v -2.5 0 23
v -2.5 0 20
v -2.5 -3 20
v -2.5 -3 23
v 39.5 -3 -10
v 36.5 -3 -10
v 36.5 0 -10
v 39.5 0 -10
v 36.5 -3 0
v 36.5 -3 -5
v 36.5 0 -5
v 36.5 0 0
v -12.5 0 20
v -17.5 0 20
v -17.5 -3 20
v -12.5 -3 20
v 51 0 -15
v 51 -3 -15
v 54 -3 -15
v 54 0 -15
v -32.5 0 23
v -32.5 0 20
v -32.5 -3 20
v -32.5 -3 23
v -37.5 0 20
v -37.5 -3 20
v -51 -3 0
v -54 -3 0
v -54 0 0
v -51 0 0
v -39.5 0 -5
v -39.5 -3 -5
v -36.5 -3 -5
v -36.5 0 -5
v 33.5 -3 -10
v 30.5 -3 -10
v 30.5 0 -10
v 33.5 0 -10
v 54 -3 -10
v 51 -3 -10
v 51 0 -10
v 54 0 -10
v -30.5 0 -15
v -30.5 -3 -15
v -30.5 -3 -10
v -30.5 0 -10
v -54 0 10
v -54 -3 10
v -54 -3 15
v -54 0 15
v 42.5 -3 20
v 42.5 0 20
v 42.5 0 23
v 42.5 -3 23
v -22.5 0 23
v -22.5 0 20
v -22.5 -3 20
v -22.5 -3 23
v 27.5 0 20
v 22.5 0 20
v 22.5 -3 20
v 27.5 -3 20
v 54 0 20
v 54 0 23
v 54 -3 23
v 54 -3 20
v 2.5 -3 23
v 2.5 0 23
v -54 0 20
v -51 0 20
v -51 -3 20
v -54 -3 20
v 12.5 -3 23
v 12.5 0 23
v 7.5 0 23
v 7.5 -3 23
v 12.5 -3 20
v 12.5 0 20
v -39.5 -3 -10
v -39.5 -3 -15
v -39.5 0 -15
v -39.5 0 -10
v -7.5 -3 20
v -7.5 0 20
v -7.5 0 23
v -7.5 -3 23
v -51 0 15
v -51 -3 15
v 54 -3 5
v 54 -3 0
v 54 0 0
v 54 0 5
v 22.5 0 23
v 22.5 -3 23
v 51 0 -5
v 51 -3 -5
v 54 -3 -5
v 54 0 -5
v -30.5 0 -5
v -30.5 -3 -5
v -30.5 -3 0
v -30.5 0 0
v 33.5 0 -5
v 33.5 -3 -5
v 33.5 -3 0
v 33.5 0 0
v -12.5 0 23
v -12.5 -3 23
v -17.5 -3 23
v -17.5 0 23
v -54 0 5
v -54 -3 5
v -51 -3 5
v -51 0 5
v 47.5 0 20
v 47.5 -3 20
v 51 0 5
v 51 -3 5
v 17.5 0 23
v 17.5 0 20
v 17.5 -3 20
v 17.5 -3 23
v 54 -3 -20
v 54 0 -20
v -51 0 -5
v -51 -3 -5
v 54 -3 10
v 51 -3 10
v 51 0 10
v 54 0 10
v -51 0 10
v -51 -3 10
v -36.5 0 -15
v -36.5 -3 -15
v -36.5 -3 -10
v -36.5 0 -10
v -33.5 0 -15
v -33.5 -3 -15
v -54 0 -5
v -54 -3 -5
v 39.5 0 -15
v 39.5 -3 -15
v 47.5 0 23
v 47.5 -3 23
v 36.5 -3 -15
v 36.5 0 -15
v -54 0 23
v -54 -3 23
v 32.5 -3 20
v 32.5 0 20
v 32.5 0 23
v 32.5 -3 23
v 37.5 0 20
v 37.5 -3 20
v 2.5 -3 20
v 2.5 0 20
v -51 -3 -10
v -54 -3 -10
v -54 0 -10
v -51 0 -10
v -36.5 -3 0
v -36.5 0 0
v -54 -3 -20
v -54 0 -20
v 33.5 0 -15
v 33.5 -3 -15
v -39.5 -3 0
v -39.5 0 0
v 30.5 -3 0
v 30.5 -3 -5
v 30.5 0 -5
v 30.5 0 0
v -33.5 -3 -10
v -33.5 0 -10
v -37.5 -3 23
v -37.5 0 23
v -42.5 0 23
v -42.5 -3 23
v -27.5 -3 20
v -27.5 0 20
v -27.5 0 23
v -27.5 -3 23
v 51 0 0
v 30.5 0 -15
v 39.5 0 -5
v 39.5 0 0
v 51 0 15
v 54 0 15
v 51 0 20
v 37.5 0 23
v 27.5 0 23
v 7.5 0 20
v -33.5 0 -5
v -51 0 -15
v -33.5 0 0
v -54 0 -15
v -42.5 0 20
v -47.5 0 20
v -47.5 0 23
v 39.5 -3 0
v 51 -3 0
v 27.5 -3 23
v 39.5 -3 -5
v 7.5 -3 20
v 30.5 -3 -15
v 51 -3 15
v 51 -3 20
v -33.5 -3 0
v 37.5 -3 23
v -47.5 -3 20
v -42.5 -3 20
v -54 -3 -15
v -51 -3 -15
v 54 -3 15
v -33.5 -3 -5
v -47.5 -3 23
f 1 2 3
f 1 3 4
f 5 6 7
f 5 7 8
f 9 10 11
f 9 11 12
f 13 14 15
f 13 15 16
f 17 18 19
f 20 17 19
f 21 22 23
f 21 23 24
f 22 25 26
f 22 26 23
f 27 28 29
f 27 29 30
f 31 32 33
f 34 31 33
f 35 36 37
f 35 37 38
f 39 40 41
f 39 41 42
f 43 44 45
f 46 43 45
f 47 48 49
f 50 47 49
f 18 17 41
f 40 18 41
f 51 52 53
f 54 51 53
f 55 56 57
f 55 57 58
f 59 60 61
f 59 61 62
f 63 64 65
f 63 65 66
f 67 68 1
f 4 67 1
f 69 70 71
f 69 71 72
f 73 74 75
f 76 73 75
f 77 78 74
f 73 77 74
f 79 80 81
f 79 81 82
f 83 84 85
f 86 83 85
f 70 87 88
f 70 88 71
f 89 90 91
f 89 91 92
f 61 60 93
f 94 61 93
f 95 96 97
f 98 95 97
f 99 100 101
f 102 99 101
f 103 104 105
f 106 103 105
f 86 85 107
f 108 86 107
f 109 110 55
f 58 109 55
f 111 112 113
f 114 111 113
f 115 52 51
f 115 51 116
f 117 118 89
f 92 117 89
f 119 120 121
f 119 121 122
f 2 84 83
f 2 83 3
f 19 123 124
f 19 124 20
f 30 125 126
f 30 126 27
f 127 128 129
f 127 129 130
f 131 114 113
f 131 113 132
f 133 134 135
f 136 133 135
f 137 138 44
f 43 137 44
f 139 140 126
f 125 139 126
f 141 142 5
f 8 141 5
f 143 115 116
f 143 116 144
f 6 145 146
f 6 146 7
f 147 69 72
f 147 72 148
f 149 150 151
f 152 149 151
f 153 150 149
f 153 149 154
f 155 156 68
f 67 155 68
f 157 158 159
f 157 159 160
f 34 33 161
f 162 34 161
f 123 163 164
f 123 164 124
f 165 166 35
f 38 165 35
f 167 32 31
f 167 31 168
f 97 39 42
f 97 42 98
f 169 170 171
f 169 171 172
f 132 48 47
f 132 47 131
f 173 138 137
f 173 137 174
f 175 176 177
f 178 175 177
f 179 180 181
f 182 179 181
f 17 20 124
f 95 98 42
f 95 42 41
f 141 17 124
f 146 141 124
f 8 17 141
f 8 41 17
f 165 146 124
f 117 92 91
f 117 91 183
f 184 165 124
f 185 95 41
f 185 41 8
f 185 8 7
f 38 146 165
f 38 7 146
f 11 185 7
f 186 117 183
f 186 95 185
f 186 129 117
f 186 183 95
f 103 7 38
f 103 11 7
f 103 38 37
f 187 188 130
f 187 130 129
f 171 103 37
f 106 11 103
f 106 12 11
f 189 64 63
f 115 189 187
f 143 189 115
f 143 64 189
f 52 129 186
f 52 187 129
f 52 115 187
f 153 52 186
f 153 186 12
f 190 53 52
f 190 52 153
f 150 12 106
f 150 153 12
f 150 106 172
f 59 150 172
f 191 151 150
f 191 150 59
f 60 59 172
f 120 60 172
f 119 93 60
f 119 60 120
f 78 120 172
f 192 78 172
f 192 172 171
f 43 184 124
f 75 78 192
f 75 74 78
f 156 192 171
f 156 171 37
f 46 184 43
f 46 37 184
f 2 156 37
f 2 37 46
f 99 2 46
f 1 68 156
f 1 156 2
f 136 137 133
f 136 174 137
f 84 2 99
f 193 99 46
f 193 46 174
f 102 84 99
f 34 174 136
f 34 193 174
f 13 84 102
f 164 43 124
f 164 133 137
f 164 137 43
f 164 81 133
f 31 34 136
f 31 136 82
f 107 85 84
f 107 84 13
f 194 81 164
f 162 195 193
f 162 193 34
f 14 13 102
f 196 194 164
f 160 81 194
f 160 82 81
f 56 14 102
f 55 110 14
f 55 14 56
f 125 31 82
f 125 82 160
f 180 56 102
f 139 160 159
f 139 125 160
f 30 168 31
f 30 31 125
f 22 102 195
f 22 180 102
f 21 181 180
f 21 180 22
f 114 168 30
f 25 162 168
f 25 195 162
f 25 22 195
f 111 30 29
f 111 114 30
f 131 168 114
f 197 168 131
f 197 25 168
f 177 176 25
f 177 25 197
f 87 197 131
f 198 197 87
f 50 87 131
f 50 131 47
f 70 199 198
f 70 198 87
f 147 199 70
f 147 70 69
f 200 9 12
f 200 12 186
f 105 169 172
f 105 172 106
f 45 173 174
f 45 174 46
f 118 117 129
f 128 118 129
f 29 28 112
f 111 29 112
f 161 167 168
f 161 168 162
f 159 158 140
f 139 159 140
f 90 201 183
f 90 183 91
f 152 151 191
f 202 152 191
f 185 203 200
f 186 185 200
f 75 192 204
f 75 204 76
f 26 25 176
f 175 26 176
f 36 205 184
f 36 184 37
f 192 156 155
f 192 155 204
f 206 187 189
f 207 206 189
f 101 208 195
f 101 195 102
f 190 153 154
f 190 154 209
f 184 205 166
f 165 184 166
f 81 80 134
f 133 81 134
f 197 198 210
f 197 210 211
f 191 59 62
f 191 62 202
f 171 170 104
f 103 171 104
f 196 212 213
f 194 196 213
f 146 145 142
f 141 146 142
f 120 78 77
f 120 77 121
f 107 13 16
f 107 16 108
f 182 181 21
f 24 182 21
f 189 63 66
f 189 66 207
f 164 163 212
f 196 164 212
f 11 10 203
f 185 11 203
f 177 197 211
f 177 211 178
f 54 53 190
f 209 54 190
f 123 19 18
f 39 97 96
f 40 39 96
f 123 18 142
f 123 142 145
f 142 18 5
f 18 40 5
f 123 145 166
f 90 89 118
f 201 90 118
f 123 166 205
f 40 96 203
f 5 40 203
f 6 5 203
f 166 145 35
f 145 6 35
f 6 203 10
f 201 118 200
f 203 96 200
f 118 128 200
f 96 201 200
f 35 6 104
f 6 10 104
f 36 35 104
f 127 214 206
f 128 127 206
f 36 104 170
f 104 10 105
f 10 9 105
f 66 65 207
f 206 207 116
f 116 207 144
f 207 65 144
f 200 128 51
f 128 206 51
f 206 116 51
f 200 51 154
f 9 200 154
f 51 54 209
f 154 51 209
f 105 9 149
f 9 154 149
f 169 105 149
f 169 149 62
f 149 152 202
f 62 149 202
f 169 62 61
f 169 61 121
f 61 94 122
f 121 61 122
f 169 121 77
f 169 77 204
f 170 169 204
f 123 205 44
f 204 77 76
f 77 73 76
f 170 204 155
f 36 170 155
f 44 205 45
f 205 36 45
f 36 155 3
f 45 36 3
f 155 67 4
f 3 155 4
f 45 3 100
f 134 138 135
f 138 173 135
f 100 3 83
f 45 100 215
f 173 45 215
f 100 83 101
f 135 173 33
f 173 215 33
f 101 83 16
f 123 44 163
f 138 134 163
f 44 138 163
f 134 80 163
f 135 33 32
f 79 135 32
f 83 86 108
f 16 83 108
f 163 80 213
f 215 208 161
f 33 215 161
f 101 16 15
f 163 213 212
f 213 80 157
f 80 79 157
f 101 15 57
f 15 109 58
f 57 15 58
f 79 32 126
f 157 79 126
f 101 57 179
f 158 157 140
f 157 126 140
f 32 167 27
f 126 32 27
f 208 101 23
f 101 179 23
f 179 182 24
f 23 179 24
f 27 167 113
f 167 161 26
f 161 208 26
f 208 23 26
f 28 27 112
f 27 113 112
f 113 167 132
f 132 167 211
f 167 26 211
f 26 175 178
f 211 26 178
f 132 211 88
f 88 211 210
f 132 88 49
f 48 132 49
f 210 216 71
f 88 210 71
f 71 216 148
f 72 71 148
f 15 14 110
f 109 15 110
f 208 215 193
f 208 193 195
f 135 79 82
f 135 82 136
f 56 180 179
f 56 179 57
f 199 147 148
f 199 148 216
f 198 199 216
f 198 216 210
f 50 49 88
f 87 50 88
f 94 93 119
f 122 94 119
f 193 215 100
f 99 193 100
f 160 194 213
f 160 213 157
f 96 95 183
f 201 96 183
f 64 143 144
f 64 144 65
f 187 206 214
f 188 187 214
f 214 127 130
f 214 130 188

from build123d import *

# Parameters (mm, degrees)
F0_W     = 102
F0_H     = 40
F1_DEPTH = 3
F2_W     = 3
F2_H     = 5
F3_DEPTH = 3
F4_W     = 5
F4_H     = 3
F5_DEPTH = 3
F6_W     = 3
F6_H     = 5
F7_DEPTH = 25


with BuildPart() as f1:
    # F0 (on Front) → F1 (new body)
    with BuildSketch(Plane.XZ):
        Rectangle(F0_W, F0_H)
    extrude(amount=F1_DEPTH)

    # F2 (on face) → F3 (join)
    with BuildSketch(Plane.XZ.offset(3)):
        with Locations((-52.5, -17.5)):
            Rectangle(F2_W, F2_H)
        with Locations((-52.5, -7.5)):
            Rectangle(F2_W, F2_H)
        with Locations((-52.5, 2.5)):
            Rectangle(F2_W, F2_H)
        with Locations((-52.5, 12.5)):
            Rectangle(F2_W, F2_H)
        with Locations((52.5, -7.5)):
            Rectangle(F2_W, F2_H)
        with Locations((52.5, -17.5)):
            Rectangle(F2_W, F2_H)
        with Locations((52.5, 12.5)):
            Rectangle(F2_W, F2_H)
        with Locations((52.5, 2.5)):
            Rectangle(F2_W, F2_H)
    extrude(amount=-F3_DEPTH)

    # F4 (on face) → F5 (join)
    with BuildSketch(Plane(origin=(0, 0, 0), x_dir=(-1, 0, 0), z_dir=(0, 1, 0))):
        with Locations((0, 21.5)):
            Rectangle(F4_W, F4_H)
        with Locations((10, 21.5)):
            Rectangle(F4_W, F4_H)
        with Locations((20, 21.5)):
            Rectangle(F4_W, F4_H)
        with Locations((30, 21.5)):
            Rectangle(F4_W, F4_H)
        with Locations((40, 21.5)):
            Rectangle(F4_W, F4_H)
        Polygon((52.5, 23), (47.5, 23), (47.5, 20), (52.5, 20), (54, 20), (54, 23), align=None)
        Polygon((-52.5, 20), (-47.5, 20), (-47.5, 23), (-52.5, 23), (-54, 23), (-54, 20), align=None)
        with Locations((-20, 21.5)):
            Rectangle(F4_W, F4_H)
        with Locations((-10, 21.5)):
            Rectangle(F4_W, F4_H)
        with Locations((-30, 21.5)):
            Rectangle(F4_W, F4_H)
        with Locations((-40, 21.5)):
            Rectangle(F4_W, F4_H)
    extrude(amount=-F5_DEPTH)

    # F6 (on face) → F7 (cut)
    with BuildSketch(Plane.XZ.offset(3)):
        with Locations((-32, -12.5)):
            Rectangle(F6_W, F6_H)
        with Locations((-32, -2.5)):
            Rectangle(F6_W, F6_H)
        with Locations((-38, -12.5)):
            Rectangle(F6_W, F6_H)
        with Locations((-38, -2.5)):
            Rectangle(F6_W, F6_H)
        with Locations((32, -12.5)):
            Rectangle(F6_W, F6_H)
        with Locations((32, -2.5)):
            Rectangle(F6_W, F6_H)
        with Locations((38, -12.5)):
            Rectangle(F6_W, F6_H)
        with Locations((38, -2.5)):
            Rectangle(F6_W, F6_H)
    extrude(amount=-F7_DEPTH, mode=Mode.SUBTRACT)


solid = f1.part
